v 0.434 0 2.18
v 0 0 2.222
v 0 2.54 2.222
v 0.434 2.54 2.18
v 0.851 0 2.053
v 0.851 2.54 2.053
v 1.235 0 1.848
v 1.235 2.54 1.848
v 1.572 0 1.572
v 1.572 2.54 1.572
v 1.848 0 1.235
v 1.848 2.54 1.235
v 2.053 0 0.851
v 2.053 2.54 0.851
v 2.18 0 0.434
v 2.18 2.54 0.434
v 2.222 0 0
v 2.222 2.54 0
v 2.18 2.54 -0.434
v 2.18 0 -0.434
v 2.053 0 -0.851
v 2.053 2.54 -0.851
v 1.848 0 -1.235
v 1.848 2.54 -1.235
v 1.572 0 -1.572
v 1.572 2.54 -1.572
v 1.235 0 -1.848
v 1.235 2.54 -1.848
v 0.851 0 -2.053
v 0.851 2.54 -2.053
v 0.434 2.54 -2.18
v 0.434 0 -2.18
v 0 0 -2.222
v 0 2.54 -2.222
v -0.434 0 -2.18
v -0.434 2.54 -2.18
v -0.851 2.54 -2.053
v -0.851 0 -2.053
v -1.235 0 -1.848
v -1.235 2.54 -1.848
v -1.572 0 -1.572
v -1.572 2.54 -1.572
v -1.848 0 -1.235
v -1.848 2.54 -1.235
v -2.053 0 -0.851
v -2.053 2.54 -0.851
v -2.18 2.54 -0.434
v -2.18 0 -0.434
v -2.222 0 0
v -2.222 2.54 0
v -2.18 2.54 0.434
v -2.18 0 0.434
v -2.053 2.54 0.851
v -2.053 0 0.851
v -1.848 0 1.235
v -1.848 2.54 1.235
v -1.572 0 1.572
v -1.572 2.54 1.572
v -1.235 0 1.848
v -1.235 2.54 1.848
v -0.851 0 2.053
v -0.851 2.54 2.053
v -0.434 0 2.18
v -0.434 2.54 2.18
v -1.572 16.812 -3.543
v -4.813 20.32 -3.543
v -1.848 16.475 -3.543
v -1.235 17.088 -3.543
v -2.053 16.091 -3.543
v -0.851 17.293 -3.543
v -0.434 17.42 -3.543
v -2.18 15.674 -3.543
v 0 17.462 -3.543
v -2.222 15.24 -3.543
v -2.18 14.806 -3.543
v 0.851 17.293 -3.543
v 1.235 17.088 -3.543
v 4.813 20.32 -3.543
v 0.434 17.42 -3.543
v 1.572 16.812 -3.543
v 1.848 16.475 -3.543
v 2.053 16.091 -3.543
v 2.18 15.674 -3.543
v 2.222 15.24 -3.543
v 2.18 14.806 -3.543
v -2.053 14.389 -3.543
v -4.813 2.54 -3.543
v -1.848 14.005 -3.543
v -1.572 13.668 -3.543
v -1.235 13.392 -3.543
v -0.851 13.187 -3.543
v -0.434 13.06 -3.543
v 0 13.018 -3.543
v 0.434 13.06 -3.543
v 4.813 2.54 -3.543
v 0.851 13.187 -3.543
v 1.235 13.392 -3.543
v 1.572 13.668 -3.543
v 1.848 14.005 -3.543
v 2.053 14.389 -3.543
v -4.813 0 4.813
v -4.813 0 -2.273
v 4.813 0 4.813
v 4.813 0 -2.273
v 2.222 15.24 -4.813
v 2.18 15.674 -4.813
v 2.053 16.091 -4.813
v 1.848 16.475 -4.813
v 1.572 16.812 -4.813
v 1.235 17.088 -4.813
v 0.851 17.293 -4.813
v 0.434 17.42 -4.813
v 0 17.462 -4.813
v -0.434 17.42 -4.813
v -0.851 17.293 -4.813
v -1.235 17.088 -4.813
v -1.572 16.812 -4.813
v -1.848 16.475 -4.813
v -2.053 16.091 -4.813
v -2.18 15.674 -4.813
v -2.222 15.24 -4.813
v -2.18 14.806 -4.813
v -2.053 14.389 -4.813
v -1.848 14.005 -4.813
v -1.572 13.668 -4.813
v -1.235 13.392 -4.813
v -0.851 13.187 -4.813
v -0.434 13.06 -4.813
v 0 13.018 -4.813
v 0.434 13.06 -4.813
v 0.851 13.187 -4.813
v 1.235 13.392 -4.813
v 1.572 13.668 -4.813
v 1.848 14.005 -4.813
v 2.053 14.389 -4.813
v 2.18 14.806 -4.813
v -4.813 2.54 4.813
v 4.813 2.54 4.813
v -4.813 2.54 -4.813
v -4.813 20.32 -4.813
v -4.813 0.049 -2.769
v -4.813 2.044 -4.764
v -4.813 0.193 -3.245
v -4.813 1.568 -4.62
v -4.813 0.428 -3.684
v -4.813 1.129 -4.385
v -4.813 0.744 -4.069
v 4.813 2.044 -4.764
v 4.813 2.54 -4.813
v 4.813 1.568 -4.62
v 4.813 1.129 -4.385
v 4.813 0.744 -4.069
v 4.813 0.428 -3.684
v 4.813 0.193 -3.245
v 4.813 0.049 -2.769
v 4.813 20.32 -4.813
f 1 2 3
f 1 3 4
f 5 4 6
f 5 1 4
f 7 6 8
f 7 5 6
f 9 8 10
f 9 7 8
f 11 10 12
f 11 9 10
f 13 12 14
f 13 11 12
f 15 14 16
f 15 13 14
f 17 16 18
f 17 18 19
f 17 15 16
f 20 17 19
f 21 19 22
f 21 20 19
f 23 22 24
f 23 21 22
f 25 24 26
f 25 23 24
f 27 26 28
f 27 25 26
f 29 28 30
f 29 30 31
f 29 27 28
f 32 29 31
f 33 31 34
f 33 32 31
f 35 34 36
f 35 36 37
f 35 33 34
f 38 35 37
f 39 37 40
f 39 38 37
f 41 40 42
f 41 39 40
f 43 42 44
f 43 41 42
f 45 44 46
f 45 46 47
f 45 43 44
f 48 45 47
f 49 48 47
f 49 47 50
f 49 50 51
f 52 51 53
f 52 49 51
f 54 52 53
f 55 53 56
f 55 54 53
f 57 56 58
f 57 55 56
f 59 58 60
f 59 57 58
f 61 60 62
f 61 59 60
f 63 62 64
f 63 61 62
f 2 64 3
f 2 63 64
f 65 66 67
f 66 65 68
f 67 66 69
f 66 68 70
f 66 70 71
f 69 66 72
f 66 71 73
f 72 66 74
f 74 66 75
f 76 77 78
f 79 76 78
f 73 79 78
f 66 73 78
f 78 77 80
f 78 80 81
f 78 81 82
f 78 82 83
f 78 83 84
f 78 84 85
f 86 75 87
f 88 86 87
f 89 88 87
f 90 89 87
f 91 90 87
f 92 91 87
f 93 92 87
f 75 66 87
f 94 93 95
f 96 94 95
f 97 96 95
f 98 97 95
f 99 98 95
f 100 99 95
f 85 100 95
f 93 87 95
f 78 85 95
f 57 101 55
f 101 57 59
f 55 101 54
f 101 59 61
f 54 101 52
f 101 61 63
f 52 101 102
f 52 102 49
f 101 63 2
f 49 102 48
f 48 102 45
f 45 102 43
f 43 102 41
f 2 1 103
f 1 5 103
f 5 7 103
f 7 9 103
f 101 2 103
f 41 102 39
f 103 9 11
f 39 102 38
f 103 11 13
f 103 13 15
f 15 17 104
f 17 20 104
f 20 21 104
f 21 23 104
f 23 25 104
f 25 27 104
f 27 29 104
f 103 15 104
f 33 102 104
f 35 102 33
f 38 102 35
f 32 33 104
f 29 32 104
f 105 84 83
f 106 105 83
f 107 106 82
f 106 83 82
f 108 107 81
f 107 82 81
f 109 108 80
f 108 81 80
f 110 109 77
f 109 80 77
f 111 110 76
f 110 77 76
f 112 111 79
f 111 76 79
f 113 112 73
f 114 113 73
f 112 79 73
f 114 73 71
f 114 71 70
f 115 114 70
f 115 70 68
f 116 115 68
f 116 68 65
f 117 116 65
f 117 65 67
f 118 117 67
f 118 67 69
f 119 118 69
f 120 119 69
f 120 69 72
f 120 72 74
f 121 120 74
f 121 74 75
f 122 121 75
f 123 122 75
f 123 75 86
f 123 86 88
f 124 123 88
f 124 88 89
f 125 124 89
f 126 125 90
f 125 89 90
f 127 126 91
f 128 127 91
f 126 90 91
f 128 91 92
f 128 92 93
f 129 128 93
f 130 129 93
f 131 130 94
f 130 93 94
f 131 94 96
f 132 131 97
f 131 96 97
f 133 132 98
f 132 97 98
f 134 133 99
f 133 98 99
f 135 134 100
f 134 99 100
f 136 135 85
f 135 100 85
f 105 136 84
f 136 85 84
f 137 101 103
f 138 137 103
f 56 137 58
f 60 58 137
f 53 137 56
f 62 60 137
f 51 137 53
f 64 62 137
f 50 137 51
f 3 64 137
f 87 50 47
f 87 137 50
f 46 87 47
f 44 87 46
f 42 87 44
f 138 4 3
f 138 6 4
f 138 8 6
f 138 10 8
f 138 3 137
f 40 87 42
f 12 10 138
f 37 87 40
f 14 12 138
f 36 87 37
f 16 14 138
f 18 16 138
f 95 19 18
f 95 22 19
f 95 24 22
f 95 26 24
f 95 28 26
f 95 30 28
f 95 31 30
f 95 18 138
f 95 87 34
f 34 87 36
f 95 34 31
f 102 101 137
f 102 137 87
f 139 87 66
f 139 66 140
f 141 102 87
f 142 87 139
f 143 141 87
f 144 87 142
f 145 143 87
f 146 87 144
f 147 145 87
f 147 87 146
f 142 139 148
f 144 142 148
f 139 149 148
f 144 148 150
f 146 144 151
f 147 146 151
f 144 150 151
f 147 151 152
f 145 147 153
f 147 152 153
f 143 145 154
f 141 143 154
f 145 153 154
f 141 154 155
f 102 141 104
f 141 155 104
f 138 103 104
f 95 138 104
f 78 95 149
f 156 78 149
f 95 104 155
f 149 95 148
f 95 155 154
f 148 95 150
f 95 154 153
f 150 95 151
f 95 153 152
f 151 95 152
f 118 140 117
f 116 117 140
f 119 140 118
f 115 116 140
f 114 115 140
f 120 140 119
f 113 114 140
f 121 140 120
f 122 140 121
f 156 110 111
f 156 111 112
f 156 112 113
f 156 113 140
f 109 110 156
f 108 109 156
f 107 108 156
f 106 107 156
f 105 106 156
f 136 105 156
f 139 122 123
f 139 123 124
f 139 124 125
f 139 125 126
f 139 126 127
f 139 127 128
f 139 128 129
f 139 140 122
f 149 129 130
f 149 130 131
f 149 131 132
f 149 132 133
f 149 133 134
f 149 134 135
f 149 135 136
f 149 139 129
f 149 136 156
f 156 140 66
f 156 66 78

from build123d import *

# Parameters (mm, degrees)
SKETCH1_W           = 9.6266
SKETCH1_H           = 8.3566
SKETCH1_R           = 2.2225
BOSS_EXTRUDE1_DEPTH = 2.54
SKETCH1_3_W         = 9.6266
SKETCH1_3_H         = 1.27
BOSS_EXTRUDE2_DEPTH = 20.32
CUT_EXTRUDE1_REACH  = 24.492
SKETCH2_R           = 2.2225
FILLET1_R           = 2.54


with BuildPart() as part:
    # Sketch1 → Boss-Extrude1 (new body)
    with BuildSketch(Plane(origin=(0, 0, 0), x_dir=(1, 0, 0), z_dir=(0, 1, 0))):
        with Locations((0, -0.635)):
            Rectangle(SKETCH1_W, SKETCH1_H)
        Circle(SKETCH1_R, mode=Mode.SUBTRACT)
    extrude(amount=BOSS_EXTRUDE1_DEPTH)

    # Sketch1<3> → Boss-Extrude2 (add)
    with BuildSketch(Plane(origin=(0, 0, 0), x_dir=(1, 0, 0), z_dir=(0, 1, 0))):
        with Locations((0, 4.1783)):
            Rectangle(SKETCH1_3_W, SKETCH1_3_H)
    extrude(amount=BOSS_EXTRUDE2_DEPTH)

    # Sketch2 → Cut-Extrude1 (cut, up to next)
    with BuildSketch(Plane.XY.offset(-3.5433), mode=Mode.PRIVATE) as cut_extrude1_sk1:
        with Locations((0, 15.24)):
            Circle(SKETCH2_R)
    cut_extrude1_tool1 = extrude(cut_extrude1_sk1.sketch, amount=-CUT_EXTRUDE1_REACH, mode=Mode.PRIVATE) & part.part
    add(cut_extrude1_tool1.solids().sort_by_distance((0, 15.24, -3.5433))[0], mode=Mode.SUBTRACT)

    # Fillet1
    fillet1_edges = [part.edges().sort_by_distance(p)[0] for p in [
        (0, 0, -4.8133),
    ]]
    fillet(fillet1_edges, radius=FILLET1_R)


solid = part.part
